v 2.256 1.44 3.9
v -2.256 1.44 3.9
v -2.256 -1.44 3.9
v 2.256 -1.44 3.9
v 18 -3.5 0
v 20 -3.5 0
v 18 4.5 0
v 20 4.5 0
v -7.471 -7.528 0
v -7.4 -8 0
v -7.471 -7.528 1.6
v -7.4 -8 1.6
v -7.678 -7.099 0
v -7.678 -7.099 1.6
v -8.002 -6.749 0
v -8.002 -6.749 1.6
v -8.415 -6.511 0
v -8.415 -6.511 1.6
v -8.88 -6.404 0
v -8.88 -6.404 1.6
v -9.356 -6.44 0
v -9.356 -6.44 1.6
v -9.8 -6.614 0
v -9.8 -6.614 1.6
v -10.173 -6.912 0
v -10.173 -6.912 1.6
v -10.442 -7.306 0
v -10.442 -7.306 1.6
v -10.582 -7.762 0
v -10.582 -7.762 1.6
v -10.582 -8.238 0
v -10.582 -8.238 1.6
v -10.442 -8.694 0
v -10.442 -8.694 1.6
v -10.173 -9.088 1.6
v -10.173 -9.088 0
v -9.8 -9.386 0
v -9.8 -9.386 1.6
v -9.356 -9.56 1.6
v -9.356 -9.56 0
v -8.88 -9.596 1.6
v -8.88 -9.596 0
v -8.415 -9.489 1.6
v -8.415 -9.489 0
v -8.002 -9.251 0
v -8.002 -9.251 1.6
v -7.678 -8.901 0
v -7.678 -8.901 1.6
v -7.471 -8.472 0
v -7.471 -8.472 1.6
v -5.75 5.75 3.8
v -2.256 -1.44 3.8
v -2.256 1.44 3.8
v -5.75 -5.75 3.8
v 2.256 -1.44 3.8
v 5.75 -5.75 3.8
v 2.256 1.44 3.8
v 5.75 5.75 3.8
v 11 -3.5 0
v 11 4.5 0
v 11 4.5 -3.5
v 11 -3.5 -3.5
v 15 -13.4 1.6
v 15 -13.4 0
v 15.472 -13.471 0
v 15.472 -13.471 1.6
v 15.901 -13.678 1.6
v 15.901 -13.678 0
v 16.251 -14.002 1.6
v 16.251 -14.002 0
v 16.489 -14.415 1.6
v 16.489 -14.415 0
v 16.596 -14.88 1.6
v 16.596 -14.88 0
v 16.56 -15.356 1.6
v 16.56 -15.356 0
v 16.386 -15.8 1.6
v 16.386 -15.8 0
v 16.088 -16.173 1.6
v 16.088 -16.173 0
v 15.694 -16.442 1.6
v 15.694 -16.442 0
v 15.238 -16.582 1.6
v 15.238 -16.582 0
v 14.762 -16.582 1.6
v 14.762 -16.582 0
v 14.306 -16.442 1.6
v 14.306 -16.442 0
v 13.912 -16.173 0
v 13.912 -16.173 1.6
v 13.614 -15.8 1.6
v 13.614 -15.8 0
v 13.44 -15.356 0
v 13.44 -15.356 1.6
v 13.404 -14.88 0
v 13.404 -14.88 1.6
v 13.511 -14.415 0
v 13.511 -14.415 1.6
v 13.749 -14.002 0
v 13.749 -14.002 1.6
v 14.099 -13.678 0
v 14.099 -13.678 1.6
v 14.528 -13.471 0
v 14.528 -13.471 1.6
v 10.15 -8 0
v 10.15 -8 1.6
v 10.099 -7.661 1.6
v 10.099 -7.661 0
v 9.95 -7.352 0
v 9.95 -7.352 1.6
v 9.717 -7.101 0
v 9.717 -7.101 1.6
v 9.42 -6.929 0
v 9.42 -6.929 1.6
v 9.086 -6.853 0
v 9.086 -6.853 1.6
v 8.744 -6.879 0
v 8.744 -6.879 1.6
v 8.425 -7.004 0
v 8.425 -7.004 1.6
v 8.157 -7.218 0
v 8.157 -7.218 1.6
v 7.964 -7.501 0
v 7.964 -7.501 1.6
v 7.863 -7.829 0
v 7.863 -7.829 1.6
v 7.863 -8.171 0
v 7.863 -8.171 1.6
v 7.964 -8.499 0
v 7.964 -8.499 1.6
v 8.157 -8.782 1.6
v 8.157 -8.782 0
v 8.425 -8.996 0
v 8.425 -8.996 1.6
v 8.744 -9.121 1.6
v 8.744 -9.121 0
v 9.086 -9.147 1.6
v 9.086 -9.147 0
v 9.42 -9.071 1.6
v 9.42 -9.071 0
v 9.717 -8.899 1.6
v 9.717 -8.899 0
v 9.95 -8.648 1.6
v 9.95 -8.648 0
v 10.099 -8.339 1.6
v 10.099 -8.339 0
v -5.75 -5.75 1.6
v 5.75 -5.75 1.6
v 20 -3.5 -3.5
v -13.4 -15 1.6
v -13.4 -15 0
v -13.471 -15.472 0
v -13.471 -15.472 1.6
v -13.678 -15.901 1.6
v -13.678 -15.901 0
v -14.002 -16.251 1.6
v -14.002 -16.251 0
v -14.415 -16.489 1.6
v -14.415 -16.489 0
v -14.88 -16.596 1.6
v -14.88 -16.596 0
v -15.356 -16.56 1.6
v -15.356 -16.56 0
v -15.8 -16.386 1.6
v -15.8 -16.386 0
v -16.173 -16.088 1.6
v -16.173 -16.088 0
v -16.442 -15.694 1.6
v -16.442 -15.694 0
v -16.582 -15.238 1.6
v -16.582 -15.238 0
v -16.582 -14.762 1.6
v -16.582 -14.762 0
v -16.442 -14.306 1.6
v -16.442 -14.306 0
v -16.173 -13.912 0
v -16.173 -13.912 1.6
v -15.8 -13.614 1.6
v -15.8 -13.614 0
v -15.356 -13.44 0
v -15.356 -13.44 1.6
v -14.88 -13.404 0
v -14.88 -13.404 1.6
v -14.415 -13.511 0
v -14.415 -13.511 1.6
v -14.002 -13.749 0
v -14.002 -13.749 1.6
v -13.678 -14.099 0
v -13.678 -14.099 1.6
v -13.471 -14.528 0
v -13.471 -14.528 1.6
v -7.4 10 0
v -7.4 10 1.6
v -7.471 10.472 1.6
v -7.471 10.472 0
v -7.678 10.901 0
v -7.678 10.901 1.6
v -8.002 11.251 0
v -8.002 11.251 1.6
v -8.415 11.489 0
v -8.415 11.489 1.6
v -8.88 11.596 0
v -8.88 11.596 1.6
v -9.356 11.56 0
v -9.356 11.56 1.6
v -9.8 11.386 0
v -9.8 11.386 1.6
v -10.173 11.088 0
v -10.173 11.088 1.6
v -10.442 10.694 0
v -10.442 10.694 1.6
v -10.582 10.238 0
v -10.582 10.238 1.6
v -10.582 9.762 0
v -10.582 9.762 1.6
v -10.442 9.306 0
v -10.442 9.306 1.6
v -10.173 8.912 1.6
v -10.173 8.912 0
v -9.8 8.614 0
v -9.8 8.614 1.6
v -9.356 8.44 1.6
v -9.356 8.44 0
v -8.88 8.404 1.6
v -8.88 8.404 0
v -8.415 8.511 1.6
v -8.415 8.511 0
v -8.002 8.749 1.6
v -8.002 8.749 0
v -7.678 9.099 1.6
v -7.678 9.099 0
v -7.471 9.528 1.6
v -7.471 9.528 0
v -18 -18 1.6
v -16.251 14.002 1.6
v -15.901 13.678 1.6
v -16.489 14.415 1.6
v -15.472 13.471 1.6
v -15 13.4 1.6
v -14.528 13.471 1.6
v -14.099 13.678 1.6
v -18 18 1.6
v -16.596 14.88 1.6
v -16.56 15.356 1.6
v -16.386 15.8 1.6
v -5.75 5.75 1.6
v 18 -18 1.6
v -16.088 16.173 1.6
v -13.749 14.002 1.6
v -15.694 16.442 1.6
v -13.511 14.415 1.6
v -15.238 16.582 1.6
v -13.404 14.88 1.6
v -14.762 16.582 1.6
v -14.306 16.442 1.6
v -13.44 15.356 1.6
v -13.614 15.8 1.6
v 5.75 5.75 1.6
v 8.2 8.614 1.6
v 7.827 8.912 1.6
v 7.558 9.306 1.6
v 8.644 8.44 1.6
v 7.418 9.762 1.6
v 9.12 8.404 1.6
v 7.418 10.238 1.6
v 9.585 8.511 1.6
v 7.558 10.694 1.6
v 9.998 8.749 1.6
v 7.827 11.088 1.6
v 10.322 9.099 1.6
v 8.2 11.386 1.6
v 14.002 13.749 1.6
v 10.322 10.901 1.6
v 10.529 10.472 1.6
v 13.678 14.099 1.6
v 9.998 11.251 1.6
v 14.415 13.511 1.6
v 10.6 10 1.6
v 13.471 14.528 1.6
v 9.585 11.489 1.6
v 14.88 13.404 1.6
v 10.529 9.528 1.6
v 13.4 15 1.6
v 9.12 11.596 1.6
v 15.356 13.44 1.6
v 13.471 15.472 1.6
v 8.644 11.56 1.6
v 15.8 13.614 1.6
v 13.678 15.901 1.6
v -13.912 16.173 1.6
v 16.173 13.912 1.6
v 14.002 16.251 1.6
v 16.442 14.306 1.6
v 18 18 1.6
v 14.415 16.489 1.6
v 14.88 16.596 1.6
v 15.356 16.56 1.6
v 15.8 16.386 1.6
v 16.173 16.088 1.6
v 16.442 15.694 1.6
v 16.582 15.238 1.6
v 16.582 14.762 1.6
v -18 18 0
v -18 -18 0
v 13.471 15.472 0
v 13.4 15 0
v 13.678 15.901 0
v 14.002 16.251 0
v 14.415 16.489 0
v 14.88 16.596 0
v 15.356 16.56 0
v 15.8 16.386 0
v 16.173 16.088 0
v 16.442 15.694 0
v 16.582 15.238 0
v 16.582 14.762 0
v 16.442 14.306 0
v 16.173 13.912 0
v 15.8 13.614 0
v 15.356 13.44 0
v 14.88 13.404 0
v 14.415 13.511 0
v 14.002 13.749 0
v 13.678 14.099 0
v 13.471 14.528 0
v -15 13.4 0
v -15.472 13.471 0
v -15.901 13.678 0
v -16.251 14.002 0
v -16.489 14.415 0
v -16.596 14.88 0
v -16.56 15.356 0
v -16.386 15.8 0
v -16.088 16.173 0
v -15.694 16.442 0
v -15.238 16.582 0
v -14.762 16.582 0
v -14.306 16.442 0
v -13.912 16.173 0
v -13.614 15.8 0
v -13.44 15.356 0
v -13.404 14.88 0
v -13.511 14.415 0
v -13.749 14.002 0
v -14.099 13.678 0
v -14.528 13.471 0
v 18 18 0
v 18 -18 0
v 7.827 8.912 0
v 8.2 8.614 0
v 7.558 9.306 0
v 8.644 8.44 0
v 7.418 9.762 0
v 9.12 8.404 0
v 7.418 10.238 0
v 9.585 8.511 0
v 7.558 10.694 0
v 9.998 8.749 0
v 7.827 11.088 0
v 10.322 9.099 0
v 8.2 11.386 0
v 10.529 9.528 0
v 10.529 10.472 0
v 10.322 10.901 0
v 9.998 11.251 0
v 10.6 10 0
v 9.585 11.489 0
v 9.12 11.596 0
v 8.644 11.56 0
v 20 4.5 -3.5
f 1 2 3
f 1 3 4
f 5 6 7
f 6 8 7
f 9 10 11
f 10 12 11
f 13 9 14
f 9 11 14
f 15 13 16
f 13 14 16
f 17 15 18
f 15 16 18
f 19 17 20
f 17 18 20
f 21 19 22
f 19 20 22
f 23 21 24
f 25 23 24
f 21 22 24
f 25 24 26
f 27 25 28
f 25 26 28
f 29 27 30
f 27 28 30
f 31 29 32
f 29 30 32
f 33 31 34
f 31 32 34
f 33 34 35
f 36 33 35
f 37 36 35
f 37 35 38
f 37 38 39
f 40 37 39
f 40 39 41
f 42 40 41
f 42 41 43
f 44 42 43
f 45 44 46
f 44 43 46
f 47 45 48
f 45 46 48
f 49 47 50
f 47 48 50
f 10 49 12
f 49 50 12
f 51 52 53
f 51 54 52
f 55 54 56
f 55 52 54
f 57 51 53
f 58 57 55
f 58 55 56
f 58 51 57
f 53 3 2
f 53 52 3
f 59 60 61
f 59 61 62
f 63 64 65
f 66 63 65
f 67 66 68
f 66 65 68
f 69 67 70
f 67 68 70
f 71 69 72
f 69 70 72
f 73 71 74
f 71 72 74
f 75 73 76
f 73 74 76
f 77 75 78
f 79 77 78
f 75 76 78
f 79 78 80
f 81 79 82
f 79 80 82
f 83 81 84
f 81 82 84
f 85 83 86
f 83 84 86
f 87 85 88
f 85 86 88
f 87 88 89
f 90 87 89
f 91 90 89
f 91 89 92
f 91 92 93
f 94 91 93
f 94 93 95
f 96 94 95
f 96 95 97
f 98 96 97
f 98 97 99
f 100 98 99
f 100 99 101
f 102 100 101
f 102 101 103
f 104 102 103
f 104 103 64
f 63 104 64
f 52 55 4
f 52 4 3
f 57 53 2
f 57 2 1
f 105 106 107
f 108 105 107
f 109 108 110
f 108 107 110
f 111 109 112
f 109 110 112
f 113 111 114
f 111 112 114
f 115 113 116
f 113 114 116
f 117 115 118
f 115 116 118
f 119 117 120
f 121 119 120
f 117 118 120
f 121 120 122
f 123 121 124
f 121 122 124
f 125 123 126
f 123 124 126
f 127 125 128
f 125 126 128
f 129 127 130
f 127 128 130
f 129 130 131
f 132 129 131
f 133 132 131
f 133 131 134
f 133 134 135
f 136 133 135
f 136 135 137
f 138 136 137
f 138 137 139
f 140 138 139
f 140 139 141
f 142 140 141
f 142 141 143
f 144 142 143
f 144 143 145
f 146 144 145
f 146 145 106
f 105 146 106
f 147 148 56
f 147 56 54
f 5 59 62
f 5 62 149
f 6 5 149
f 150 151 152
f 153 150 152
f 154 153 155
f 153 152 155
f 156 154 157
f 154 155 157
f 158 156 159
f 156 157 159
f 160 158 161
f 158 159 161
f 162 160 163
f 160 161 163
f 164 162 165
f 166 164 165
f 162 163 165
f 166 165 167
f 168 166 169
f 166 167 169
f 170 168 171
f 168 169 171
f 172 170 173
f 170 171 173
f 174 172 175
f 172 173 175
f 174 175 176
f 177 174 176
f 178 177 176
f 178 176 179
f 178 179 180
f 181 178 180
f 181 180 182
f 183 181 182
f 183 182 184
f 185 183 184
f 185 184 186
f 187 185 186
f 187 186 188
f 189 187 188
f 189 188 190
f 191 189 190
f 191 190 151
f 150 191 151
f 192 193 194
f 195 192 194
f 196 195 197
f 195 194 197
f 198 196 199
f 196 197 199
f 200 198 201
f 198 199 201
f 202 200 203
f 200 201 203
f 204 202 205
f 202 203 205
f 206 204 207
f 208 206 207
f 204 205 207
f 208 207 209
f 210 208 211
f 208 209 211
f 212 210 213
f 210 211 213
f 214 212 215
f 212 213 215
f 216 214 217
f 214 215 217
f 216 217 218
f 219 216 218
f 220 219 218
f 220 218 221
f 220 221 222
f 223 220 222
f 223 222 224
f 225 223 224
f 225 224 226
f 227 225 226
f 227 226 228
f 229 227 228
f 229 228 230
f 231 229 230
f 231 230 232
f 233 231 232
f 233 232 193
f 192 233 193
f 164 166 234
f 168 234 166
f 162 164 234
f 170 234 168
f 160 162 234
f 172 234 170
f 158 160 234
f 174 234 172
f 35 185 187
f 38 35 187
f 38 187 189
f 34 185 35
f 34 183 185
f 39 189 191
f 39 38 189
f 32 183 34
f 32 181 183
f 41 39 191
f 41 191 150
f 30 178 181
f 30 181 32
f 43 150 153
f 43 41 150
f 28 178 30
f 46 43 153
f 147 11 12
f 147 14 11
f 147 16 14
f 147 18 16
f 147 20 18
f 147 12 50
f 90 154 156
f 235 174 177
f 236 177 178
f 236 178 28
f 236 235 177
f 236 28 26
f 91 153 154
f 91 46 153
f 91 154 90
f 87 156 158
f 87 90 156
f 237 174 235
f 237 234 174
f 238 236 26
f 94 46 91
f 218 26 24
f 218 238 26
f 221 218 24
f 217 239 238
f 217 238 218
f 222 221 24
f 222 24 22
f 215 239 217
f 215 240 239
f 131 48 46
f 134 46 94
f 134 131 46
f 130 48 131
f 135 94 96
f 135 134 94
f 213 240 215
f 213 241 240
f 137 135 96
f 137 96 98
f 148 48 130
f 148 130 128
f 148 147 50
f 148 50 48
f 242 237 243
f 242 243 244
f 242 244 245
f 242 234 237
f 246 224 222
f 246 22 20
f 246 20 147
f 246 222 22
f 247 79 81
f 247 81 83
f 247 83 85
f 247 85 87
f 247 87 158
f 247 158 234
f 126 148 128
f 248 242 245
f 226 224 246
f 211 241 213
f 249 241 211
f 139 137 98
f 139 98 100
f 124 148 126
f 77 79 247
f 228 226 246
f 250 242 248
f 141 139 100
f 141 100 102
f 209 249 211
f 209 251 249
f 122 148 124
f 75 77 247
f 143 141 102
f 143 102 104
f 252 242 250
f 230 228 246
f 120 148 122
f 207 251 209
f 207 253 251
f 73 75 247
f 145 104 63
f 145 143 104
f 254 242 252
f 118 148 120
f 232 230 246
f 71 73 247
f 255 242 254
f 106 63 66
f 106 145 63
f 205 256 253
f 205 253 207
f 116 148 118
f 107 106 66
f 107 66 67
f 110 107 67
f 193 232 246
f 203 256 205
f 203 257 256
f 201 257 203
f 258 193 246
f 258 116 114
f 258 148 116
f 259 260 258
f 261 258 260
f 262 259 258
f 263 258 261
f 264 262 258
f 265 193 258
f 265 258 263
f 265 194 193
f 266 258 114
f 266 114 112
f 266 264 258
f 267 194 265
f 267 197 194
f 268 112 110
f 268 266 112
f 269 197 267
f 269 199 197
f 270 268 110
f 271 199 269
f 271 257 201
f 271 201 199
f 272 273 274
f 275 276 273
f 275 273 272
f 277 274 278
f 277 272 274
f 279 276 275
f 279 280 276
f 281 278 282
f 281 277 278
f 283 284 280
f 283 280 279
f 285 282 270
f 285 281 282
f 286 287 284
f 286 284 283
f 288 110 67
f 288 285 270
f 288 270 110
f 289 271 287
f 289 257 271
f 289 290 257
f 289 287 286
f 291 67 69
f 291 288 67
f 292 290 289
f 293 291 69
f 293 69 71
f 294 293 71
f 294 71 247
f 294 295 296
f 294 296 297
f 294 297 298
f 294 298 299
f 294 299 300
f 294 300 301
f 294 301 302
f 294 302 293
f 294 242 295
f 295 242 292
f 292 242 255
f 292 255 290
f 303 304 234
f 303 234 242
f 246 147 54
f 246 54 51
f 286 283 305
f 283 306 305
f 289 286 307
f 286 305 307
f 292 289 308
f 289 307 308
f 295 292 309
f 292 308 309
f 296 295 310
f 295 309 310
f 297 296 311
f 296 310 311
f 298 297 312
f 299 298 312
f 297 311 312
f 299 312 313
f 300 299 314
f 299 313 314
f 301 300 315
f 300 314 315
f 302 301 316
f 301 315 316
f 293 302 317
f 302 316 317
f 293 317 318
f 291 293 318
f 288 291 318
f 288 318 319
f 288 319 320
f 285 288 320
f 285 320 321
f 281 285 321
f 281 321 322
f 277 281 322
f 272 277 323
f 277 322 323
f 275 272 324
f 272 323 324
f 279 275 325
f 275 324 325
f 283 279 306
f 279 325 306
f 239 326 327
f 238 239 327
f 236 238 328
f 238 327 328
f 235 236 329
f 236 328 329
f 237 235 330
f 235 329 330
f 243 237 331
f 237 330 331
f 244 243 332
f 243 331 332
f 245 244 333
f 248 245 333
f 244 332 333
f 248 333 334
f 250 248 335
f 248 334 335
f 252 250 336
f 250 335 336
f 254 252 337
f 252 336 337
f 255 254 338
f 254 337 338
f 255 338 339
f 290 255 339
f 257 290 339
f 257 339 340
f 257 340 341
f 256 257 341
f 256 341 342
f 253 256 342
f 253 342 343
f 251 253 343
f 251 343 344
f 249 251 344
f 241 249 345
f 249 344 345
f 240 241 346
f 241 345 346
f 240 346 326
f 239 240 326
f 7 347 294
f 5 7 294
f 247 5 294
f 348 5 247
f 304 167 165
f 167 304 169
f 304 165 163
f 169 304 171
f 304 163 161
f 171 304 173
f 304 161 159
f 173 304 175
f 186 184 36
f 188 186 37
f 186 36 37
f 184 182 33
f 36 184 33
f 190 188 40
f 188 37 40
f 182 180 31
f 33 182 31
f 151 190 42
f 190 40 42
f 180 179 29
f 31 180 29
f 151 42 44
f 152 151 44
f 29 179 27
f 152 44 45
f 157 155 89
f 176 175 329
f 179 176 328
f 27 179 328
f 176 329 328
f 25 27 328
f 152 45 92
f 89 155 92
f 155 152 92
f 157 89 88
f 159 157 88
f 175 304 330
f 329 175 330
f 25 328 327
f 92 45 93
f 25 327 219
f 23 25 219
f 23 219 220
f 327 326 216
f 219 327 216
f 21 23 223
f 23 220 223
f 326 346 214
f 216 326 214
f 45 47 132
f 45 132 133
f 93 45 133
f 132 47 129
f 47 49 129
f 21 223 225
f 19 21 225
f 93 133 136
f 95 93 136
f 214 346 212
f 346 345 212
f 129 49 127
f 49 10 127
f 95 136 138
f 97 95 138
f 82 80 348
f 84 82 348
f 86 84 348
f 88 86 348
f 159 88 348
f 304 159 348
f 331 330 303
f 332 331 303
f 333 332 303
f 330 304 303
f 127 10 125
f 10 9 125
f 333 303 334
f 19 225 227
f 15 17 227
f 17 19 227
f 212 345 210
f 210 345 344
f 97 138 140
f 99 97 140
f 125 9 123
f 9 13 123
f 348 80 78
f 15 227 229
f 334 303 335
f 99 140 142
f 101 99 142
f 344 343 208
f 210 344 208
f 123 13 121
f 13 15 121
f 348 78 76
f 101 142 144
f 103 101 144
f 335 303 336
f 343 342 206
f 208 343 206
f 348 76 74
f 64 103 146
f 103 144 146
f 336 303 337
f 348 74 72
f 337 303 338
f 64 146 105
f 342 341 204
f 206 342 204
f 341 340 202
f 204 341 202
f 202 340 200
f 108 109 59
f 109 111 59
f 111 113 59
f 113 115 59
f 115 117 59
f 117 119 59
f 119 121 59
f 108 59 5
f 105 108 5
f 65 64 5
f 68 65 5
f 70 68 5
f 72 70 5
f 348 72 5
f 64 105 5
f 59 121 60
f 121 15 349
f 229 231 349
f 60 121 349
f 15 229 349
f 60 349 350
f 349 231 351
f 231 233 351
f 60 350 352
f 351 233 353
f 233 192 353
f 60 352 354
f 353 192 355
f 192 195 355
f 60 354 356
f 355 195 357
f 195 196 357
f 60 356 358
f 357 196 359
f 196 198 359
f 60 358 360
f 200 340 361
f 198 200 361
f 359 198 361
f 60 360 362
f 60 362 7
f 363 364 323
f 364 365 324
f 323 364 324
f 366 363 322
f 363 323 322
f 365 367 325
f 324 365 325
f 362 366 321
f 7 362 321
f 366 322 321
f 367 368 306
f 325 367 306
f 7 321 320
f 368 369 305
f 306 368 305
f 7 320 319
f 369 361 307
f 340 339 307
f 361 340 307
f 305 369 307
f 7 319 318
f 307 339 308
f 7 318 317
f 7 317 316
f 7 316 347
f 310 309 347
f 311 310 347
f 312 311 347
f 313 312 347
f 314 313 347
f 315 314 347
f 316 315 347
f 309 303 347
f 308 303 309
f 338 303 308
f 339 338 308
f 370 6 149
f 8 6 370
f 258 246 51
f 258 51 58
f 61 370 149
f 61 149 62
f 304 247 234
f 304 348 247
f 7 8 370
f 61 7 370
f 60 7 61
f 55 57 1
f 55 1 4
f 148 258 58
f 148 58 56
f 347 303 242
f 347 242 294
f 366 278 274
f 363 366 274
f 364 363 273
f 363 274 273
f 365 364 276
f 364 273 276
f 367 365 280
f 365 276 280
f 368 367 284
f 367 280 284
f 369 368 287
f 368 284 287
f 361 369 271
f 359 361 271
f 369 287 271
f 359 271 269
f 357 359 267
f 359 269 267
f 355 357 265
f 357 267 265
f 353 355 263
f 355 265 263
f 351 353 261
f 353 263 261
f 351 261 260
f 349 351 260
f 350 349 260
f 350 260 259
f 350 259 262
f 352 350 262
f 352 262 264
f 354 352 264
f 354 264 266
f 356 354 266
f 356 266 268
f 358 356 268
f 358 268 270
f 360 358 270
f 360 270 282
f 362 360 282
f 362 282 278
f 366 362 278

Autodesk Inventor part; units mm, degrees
ref_plane "YZ Plane" through (0, 0, 0) normal (1, 0, 0) x (0, 1, 0)
ref_plane "XZ Plane" through (0, 0, 0) normal (0, 1, 0) x (-1, 0, 0)
ref_plane "XY Plane" through (0, 0, 0) normal (0, 0, 1) x (1, 0, 0)
sketch "Sketch1" plane through (0, 0, 0) normal (0, 0, 1) x (1, 0, 0)
  line L0 (-25.2, 0) -> (25.2, 0) construction
  line L1 (0, -25.2) -> (0, 25.2) construction
  line L2 (-18, 18) -> (18, 18)
  line L3 (18, 18) -> (18, -18)
  line L4 (18, -18) -> (-18, -18)
  line L5 (-18, -18) -> (-18, 18)
  point P0 (0, 0)
  point P1 (0, 18)
  point P2 (18, 0)
  dimension "d0" = 36
  dimension "d1" = 36
extrude "Extrusion1" add sketch "Sketch1" along normal blind 1.6
sketch "Sketch2" plane through (0, 0, 1.6) normal (0, 0, 1) x (1, 0, 0)
  point P0 (0, 0)
  point P1 (-15, 15)
  dimension "d4" = 15
  dimension "d5" = 15
hole "Hole1" at (-15, 15, 1.6) direction (0, 0, -1) diameter 3.2 end through all
pattern_circular "Circular Pattern1" count 4 over 360 about axis through (0, 0, -10) along (0, 0, 1) of "Hole1"
sketch "Sketch3" plane through (0, 0, 1.6) normal (0, 0, 1) x (1, 0, 0)
  line L0 (-25.2, 0) -> (25.2, 0) construction
  line L1 (0, -25.2) -> (0, 25.2) construction
  line L2 (-2.256, 1.44) -> (2.256, 1.44)
  line L3 (2.256, 1.44) -> (2.256, -1.44)
  line L4 (2.256, -1.44) -> (-2.256, -1.44)
  line L5 (-2.256, -1.44) -> (-2.256, 1.44)
  point P0 (0, 0)
  point P1 (0, 1.44)
  point P2 (2.256, 0)
  dimension "d16" = 4.512
  dimension "d17" = 2.88
extrude "Extrusion2" add sketch "Sketch3" along normal blind 2.3
sketch "Sketch4" plane through (0, 0, 1.6) normal (0, 0, 1) x (1, 0, 0)
  line L0 (-5.75, 5.75) -> (5.75, 5.75)
  line L1 (5.75, 5.75) -> (5.75, -5.75)
  line L2 (5.75, -5.75) -> (-5.75, -5.75)
  line L3 (-5.75, -5.75) -> (-5.75, 5.75)
  line L4 (-25.2, 0) -> (25.2, 0) construction
  line L5 (0, -25.2) -> (0, 25.2) construction
  point P0 (0, 0)
  point P1 (0, 5.75)
  point P2 (5.75, 0)
  dimension "d20" = 11.5
  dimension "d21" = 11.5
extrude "Extrusion3" add sketch "Sketch4" along normal blind 2.2
sketch "Sketch5" plane through (0, 0, 1.6) normal (0, 0, 1) x (1, 0, 0)
  point P0 (0, 0)
sketch "Sketch6" plane through (0, 0, 0) normal (0, 0, -1) x (-1, 0, 0)
  line L0 (25.2, 0) -> (-25.2, 0) projected
  line L1 (0, -25.2) -> (0, 25.2) projected
  line L2 (-20, 4.5) -> (-11, 4.5)
  line L3 (-11, 4.5) -> (-11, -3.5)
  line L4 (-11, -3.5) -> (-20, -3.5)
  line L5 (-20, -3.5) -> (-20, 4.5)
  line L6 (-18, 18) -> (-18, -18) projected
  line L7 (-18, -18) -> (18, -18) projected
  point P0 (0, 0)
  point P1 (-11, 0.5)
  dimension "d24" = 9
  dimension "d25" = 8
  dimension "d26" = 2
  dimension "d58" = 18.5
extrude "Extrusion4" add sketch "Sketch6" along normal blind 3.5 contours L3 L4 L6 L0 | L0 L6 L2 L3 | L6 L4 L5 L0 | L0 L5 L2 L6
sketch "Sketch7" plane through (0, 0, 1.6) normal (0, 0, 1) x (1, 0, 0)
  line L0 (-25.6, 0) -> (27.6, 0) projected
  line L1 (0, -25.2) -> (0, 25.2) projected
  line L2 (18, -18) -> (18, 18) projected
  line L3 (18, -18) -> (-18, -18) projected
  circle A0 centre (9, -8) radius 1.15
  circle A1 centre (-9, -8) radius 1.6
  circle A2 centre (-9, 10) radius 1.6
  circle A3 centre (9, 10) radius 1.6
  line L4 (-18, 18) -> (18, 18) projected
  point P0 (0, 0)
  dimension "d44" = 3.2
  dimension "d45" = 3.2
  dimension "d46" = 3.2
  dimension "d47" = 2.3
  dimension "d48" = 10
  dimension "d49" = 10
  dimension "d50" = 9
  dimension "d51" = 9
  dimension "d52" = 8
  dimension "d53" = 8
  dimension "d54" = 18
  dimension "d55" = 18
extrude "Extrusion5" cut sketch "Sketch7" against normal through all contours A0 | A1 | A2 | A3
equation "\"d20\" = d21"
properties part number "F103" material "Acetal Resin, Black"
